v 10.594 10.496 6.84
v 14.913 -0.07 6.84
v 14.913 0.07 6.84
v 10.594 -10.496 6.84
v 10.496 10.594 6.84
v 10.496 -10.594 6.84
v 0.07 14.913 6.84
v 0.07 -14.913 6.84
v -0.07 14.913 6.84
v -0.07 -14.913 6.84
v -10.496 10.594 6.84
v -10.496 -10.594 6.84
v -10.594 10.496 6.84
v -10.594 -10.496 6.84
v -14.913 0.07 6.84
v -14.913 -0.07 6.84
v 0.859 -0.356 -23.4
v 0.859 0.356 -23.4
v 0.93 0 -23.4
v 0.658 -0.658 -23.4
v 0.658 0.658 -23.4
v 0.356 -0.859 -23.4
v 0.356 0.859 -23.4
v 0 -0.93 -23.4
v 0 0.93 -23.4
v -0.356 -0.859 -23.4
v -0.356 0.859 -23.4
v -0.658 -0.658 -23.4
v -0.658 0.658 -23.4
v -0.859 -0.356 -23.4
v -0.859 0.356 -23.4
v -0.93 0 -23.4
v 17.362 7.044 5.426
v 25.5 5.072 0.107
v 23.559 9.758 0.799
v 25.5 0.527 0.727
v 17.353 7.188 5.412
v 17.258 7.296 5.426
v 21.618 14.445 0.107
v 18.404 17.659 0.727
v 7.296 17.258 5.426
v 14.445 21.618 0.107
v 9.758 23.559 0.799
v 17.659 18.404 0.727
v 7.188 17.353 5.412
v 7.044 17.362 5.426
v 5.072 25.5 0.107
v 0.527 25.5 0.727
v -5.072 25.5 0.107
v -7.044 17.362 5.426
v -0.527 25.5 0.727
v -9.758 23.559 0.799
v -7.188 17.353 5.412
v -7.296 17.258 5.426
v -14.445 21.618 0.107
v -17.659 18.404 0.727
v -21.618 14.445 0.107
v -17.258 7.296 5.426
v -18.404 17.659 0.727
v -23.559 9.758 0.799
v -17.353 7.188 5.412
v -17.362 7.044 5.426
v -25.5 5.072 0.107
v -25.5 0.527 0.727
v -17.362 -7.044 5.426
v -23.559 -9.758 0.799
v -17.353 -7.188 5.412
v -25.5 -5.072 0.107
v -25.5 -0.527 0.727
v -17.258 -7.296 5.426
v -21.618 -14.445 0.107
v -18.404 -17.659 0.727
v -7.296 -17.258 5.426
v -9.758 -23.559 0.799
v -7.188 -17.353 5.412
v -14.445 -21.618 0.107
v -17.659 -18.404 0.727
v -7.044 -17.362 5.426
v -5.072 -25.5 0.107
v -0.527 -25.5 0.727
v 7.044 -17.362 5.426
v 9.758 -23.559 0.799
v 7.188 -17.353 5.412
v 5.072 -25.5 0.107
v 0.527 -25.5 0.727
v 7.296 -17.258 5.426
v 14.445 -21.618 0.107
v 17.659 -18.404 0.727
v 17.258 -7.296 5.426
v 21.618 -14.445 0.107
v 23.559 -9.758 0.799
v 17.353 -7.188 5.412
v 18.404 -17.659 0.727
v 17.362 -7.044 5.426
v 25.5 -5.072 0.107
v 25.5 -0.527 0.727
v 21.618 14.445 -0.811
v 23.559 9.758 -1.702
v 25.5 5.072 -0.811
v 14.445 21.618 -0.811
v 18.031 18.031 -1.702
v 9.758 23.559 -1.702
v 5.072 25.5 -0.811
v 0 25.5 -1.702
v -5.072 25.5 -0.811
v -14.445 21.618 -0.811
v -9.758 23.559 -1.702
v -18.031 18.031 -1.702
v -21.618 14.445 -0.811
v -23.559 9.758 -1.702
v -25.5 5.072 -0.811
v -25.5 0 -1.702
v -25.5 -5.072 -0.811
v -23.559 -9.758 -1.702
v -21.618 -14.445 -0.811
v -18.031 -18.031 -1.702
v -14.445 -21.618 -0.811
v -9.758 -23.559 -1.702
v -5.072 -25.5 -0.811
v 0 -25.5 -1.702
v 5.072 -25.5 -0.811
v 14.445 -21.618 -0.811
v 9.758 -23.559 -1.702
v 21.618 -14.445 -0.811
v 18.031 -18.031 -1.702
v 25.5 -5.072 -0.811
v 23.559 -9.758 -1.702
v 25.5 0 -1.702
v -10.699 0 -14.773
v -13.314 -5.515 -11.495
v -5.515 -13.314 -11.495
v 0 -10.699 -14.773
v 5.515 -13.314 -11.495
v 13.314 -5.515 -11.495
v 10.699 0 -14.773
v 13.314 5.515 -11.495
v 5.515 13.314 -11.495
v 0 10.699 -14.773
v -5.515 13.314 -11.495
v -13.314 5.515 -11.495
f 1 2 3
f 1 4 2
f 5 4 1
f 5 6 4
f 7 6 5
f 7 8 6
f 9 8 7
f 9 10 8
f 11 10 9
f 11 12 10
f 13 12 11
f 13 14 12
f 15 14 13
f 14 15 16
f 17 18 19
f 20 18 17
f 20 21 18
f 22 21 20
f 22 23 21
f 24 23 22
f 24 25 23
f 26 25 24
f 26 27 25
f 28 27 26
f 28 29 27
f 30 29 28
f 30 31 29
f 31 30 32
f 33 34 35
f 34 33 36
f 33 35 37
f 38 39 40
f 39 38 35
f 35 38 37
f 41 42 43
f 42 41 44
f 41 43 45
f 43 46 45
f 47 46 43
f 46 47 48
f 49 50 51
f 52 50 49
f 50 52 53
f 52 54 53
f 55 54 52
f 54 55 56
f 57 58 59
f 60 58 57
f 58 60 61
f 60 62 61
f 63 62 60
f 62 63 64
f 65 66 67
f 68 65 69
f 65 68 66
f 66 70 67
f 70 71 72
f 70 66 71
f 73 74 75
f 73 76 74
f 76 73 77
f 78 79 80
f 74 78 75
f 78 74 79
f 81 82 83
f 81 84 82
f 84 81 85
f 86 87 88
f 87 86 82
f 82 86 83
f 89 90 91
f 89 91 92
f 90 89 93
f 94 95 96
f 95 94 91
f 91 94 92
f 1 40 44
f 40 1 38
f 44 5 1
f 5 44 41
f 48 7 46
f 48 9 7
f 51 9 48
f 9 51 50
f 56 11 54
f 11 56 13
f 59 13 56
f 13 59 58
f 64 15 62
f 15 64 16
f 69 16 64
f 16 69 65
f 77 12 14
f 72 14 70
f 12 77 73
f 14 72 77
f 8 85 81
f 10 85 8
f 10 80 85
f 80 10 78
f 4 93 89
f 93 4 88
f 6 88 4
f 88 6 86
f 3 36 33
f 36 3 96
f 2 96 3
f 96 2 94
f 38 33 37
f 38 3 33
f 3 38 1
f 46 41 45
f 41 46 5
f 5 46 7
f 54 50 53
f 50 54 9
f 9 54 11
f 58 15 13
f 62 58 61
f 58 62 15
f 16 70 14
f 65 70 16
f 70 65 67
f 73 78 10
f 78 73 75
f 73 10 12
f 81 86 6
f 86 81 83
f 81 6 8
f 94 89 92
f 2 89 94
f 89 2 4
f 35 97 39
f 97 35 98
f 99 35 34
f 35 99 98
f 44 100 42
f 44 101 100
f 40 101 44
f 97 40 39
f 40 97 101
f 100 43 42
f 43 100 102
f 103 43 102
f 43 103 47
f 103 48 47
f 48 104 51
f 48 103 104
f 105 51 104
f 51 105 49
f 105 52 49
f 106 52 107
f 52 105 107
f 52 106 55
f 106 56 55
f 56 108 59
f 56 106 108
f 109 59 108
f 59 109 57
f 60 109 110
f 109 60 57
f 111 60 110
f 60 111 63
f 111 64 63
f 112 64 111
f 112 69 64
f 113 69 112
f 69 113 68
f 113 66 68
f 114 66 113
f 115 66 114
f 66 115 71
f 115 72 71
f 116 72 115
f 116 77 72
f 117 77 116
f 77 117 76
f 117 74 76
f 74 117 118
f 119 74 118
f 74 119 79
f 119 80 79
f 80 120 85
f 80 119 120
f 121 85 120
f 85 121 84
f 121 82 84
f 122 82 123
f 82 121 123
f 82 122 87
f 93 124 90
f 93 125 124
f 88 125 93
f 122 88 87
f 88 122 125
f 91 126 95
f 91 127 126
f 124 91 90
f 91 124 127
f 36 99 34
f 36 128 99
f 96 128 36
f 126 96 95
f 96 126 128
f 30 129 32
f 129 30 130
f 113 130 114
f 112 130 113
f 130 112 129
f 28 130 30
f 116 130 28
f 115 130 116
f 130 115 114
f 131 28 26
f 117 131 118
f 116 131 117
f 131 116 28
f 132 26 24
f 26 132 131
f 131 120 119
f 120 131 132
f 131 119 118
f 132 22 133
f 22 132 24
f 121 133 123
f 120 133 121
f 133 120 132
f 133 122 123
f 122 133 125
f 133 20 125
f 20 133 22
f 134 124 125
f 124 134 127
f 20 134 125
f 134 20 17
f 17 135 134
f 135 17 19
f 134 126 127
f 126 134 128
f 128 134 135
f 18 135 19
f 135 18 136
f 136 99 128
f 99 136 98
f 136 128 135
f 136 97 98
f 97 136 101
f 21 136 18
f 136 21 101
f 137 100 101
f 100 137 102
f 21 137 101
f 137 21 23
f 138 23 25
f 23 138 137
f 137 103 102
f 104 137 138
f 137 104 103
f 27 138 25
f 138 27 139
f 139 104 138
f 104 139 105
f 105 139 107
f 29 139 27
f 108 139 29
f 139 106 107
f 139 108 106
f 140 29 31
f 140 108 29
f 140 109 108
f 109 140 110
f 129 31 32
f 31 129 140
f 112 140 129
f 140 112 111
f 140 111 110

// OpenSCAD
/*
  create a brilliant cut diamond based on the guidance in 
     http://www.usfacetersguild.org/gem_designs/simple_brilliance/
  with an added cullet to make a total of (1+16+8+8+16+1+16 )= 66 factes
  grind subtracts material according to the data which sets the
    start,increment,limit and axial angle
  e.g.
     B 	35.00 	01-03-05-07-09-11-13-15-17-19-21-23-25-27-29-31
  translates to 
     grind(1,2,32,35..)

  the distance from the centre of these facets is height and 
  this is set by experimentation to make the facets follow the pattern
  (I guess they could be computed but changing them by hand retains a 
   sense of the operation of a mechanical faceting machine)

  thanks to nop-head and the openscad forum

  Kit Wallace 
*/

function make_facets(start,increment,limit,angle,height) =
    start <= limit
      ? concat([[start/limit*360, angle, height]] ,
               make_facets(start+increment,increment,limit,angle,height))
      : [] ;

module body(Size=100) {
    cube(Size,center=true);
}

module cut_facet_data(index,angle,height,Width=200,Depth=50) {
     rotate([0,0,index])
        rotate([0,angle,0])
           translate([0,0,Depth/2 + height])
              cube([Width,Width,Depth],center=true);
}

module cut_facets(facets, n) {
   for (i =[0:n-1]) 
       cut_facet(facets[i]);
}

module cut_facet(facet) {
   cut_facet_data(facet[0],facet[1],facet[2]);
}

module gem(facets,n) {
   difference() {
      if (n==1) body(); else gem(facets,n-1);
      cut_facet(facets[n-1]);
   }
}

function brilliant_facets() =
 concat( 
   make_facets(1,1,1,0,2.28),      // table
   make_facets(1,1,1,180,7.8),     // culet
   make_facets(1,2,32,35,5),       // B
   make_facets(4,4,32,30,4.46),    // M
   make_facets(2,4,32,16,3.46),    // S
   make_facets(2,2,32,90,8.5),     // girdle
   make_facets(1,2,32,42+180,6)    // C
 ); 

facets = brilliant_facets();
echo (len(facets), facets);

scale(3) gem(facets,len(facets));
